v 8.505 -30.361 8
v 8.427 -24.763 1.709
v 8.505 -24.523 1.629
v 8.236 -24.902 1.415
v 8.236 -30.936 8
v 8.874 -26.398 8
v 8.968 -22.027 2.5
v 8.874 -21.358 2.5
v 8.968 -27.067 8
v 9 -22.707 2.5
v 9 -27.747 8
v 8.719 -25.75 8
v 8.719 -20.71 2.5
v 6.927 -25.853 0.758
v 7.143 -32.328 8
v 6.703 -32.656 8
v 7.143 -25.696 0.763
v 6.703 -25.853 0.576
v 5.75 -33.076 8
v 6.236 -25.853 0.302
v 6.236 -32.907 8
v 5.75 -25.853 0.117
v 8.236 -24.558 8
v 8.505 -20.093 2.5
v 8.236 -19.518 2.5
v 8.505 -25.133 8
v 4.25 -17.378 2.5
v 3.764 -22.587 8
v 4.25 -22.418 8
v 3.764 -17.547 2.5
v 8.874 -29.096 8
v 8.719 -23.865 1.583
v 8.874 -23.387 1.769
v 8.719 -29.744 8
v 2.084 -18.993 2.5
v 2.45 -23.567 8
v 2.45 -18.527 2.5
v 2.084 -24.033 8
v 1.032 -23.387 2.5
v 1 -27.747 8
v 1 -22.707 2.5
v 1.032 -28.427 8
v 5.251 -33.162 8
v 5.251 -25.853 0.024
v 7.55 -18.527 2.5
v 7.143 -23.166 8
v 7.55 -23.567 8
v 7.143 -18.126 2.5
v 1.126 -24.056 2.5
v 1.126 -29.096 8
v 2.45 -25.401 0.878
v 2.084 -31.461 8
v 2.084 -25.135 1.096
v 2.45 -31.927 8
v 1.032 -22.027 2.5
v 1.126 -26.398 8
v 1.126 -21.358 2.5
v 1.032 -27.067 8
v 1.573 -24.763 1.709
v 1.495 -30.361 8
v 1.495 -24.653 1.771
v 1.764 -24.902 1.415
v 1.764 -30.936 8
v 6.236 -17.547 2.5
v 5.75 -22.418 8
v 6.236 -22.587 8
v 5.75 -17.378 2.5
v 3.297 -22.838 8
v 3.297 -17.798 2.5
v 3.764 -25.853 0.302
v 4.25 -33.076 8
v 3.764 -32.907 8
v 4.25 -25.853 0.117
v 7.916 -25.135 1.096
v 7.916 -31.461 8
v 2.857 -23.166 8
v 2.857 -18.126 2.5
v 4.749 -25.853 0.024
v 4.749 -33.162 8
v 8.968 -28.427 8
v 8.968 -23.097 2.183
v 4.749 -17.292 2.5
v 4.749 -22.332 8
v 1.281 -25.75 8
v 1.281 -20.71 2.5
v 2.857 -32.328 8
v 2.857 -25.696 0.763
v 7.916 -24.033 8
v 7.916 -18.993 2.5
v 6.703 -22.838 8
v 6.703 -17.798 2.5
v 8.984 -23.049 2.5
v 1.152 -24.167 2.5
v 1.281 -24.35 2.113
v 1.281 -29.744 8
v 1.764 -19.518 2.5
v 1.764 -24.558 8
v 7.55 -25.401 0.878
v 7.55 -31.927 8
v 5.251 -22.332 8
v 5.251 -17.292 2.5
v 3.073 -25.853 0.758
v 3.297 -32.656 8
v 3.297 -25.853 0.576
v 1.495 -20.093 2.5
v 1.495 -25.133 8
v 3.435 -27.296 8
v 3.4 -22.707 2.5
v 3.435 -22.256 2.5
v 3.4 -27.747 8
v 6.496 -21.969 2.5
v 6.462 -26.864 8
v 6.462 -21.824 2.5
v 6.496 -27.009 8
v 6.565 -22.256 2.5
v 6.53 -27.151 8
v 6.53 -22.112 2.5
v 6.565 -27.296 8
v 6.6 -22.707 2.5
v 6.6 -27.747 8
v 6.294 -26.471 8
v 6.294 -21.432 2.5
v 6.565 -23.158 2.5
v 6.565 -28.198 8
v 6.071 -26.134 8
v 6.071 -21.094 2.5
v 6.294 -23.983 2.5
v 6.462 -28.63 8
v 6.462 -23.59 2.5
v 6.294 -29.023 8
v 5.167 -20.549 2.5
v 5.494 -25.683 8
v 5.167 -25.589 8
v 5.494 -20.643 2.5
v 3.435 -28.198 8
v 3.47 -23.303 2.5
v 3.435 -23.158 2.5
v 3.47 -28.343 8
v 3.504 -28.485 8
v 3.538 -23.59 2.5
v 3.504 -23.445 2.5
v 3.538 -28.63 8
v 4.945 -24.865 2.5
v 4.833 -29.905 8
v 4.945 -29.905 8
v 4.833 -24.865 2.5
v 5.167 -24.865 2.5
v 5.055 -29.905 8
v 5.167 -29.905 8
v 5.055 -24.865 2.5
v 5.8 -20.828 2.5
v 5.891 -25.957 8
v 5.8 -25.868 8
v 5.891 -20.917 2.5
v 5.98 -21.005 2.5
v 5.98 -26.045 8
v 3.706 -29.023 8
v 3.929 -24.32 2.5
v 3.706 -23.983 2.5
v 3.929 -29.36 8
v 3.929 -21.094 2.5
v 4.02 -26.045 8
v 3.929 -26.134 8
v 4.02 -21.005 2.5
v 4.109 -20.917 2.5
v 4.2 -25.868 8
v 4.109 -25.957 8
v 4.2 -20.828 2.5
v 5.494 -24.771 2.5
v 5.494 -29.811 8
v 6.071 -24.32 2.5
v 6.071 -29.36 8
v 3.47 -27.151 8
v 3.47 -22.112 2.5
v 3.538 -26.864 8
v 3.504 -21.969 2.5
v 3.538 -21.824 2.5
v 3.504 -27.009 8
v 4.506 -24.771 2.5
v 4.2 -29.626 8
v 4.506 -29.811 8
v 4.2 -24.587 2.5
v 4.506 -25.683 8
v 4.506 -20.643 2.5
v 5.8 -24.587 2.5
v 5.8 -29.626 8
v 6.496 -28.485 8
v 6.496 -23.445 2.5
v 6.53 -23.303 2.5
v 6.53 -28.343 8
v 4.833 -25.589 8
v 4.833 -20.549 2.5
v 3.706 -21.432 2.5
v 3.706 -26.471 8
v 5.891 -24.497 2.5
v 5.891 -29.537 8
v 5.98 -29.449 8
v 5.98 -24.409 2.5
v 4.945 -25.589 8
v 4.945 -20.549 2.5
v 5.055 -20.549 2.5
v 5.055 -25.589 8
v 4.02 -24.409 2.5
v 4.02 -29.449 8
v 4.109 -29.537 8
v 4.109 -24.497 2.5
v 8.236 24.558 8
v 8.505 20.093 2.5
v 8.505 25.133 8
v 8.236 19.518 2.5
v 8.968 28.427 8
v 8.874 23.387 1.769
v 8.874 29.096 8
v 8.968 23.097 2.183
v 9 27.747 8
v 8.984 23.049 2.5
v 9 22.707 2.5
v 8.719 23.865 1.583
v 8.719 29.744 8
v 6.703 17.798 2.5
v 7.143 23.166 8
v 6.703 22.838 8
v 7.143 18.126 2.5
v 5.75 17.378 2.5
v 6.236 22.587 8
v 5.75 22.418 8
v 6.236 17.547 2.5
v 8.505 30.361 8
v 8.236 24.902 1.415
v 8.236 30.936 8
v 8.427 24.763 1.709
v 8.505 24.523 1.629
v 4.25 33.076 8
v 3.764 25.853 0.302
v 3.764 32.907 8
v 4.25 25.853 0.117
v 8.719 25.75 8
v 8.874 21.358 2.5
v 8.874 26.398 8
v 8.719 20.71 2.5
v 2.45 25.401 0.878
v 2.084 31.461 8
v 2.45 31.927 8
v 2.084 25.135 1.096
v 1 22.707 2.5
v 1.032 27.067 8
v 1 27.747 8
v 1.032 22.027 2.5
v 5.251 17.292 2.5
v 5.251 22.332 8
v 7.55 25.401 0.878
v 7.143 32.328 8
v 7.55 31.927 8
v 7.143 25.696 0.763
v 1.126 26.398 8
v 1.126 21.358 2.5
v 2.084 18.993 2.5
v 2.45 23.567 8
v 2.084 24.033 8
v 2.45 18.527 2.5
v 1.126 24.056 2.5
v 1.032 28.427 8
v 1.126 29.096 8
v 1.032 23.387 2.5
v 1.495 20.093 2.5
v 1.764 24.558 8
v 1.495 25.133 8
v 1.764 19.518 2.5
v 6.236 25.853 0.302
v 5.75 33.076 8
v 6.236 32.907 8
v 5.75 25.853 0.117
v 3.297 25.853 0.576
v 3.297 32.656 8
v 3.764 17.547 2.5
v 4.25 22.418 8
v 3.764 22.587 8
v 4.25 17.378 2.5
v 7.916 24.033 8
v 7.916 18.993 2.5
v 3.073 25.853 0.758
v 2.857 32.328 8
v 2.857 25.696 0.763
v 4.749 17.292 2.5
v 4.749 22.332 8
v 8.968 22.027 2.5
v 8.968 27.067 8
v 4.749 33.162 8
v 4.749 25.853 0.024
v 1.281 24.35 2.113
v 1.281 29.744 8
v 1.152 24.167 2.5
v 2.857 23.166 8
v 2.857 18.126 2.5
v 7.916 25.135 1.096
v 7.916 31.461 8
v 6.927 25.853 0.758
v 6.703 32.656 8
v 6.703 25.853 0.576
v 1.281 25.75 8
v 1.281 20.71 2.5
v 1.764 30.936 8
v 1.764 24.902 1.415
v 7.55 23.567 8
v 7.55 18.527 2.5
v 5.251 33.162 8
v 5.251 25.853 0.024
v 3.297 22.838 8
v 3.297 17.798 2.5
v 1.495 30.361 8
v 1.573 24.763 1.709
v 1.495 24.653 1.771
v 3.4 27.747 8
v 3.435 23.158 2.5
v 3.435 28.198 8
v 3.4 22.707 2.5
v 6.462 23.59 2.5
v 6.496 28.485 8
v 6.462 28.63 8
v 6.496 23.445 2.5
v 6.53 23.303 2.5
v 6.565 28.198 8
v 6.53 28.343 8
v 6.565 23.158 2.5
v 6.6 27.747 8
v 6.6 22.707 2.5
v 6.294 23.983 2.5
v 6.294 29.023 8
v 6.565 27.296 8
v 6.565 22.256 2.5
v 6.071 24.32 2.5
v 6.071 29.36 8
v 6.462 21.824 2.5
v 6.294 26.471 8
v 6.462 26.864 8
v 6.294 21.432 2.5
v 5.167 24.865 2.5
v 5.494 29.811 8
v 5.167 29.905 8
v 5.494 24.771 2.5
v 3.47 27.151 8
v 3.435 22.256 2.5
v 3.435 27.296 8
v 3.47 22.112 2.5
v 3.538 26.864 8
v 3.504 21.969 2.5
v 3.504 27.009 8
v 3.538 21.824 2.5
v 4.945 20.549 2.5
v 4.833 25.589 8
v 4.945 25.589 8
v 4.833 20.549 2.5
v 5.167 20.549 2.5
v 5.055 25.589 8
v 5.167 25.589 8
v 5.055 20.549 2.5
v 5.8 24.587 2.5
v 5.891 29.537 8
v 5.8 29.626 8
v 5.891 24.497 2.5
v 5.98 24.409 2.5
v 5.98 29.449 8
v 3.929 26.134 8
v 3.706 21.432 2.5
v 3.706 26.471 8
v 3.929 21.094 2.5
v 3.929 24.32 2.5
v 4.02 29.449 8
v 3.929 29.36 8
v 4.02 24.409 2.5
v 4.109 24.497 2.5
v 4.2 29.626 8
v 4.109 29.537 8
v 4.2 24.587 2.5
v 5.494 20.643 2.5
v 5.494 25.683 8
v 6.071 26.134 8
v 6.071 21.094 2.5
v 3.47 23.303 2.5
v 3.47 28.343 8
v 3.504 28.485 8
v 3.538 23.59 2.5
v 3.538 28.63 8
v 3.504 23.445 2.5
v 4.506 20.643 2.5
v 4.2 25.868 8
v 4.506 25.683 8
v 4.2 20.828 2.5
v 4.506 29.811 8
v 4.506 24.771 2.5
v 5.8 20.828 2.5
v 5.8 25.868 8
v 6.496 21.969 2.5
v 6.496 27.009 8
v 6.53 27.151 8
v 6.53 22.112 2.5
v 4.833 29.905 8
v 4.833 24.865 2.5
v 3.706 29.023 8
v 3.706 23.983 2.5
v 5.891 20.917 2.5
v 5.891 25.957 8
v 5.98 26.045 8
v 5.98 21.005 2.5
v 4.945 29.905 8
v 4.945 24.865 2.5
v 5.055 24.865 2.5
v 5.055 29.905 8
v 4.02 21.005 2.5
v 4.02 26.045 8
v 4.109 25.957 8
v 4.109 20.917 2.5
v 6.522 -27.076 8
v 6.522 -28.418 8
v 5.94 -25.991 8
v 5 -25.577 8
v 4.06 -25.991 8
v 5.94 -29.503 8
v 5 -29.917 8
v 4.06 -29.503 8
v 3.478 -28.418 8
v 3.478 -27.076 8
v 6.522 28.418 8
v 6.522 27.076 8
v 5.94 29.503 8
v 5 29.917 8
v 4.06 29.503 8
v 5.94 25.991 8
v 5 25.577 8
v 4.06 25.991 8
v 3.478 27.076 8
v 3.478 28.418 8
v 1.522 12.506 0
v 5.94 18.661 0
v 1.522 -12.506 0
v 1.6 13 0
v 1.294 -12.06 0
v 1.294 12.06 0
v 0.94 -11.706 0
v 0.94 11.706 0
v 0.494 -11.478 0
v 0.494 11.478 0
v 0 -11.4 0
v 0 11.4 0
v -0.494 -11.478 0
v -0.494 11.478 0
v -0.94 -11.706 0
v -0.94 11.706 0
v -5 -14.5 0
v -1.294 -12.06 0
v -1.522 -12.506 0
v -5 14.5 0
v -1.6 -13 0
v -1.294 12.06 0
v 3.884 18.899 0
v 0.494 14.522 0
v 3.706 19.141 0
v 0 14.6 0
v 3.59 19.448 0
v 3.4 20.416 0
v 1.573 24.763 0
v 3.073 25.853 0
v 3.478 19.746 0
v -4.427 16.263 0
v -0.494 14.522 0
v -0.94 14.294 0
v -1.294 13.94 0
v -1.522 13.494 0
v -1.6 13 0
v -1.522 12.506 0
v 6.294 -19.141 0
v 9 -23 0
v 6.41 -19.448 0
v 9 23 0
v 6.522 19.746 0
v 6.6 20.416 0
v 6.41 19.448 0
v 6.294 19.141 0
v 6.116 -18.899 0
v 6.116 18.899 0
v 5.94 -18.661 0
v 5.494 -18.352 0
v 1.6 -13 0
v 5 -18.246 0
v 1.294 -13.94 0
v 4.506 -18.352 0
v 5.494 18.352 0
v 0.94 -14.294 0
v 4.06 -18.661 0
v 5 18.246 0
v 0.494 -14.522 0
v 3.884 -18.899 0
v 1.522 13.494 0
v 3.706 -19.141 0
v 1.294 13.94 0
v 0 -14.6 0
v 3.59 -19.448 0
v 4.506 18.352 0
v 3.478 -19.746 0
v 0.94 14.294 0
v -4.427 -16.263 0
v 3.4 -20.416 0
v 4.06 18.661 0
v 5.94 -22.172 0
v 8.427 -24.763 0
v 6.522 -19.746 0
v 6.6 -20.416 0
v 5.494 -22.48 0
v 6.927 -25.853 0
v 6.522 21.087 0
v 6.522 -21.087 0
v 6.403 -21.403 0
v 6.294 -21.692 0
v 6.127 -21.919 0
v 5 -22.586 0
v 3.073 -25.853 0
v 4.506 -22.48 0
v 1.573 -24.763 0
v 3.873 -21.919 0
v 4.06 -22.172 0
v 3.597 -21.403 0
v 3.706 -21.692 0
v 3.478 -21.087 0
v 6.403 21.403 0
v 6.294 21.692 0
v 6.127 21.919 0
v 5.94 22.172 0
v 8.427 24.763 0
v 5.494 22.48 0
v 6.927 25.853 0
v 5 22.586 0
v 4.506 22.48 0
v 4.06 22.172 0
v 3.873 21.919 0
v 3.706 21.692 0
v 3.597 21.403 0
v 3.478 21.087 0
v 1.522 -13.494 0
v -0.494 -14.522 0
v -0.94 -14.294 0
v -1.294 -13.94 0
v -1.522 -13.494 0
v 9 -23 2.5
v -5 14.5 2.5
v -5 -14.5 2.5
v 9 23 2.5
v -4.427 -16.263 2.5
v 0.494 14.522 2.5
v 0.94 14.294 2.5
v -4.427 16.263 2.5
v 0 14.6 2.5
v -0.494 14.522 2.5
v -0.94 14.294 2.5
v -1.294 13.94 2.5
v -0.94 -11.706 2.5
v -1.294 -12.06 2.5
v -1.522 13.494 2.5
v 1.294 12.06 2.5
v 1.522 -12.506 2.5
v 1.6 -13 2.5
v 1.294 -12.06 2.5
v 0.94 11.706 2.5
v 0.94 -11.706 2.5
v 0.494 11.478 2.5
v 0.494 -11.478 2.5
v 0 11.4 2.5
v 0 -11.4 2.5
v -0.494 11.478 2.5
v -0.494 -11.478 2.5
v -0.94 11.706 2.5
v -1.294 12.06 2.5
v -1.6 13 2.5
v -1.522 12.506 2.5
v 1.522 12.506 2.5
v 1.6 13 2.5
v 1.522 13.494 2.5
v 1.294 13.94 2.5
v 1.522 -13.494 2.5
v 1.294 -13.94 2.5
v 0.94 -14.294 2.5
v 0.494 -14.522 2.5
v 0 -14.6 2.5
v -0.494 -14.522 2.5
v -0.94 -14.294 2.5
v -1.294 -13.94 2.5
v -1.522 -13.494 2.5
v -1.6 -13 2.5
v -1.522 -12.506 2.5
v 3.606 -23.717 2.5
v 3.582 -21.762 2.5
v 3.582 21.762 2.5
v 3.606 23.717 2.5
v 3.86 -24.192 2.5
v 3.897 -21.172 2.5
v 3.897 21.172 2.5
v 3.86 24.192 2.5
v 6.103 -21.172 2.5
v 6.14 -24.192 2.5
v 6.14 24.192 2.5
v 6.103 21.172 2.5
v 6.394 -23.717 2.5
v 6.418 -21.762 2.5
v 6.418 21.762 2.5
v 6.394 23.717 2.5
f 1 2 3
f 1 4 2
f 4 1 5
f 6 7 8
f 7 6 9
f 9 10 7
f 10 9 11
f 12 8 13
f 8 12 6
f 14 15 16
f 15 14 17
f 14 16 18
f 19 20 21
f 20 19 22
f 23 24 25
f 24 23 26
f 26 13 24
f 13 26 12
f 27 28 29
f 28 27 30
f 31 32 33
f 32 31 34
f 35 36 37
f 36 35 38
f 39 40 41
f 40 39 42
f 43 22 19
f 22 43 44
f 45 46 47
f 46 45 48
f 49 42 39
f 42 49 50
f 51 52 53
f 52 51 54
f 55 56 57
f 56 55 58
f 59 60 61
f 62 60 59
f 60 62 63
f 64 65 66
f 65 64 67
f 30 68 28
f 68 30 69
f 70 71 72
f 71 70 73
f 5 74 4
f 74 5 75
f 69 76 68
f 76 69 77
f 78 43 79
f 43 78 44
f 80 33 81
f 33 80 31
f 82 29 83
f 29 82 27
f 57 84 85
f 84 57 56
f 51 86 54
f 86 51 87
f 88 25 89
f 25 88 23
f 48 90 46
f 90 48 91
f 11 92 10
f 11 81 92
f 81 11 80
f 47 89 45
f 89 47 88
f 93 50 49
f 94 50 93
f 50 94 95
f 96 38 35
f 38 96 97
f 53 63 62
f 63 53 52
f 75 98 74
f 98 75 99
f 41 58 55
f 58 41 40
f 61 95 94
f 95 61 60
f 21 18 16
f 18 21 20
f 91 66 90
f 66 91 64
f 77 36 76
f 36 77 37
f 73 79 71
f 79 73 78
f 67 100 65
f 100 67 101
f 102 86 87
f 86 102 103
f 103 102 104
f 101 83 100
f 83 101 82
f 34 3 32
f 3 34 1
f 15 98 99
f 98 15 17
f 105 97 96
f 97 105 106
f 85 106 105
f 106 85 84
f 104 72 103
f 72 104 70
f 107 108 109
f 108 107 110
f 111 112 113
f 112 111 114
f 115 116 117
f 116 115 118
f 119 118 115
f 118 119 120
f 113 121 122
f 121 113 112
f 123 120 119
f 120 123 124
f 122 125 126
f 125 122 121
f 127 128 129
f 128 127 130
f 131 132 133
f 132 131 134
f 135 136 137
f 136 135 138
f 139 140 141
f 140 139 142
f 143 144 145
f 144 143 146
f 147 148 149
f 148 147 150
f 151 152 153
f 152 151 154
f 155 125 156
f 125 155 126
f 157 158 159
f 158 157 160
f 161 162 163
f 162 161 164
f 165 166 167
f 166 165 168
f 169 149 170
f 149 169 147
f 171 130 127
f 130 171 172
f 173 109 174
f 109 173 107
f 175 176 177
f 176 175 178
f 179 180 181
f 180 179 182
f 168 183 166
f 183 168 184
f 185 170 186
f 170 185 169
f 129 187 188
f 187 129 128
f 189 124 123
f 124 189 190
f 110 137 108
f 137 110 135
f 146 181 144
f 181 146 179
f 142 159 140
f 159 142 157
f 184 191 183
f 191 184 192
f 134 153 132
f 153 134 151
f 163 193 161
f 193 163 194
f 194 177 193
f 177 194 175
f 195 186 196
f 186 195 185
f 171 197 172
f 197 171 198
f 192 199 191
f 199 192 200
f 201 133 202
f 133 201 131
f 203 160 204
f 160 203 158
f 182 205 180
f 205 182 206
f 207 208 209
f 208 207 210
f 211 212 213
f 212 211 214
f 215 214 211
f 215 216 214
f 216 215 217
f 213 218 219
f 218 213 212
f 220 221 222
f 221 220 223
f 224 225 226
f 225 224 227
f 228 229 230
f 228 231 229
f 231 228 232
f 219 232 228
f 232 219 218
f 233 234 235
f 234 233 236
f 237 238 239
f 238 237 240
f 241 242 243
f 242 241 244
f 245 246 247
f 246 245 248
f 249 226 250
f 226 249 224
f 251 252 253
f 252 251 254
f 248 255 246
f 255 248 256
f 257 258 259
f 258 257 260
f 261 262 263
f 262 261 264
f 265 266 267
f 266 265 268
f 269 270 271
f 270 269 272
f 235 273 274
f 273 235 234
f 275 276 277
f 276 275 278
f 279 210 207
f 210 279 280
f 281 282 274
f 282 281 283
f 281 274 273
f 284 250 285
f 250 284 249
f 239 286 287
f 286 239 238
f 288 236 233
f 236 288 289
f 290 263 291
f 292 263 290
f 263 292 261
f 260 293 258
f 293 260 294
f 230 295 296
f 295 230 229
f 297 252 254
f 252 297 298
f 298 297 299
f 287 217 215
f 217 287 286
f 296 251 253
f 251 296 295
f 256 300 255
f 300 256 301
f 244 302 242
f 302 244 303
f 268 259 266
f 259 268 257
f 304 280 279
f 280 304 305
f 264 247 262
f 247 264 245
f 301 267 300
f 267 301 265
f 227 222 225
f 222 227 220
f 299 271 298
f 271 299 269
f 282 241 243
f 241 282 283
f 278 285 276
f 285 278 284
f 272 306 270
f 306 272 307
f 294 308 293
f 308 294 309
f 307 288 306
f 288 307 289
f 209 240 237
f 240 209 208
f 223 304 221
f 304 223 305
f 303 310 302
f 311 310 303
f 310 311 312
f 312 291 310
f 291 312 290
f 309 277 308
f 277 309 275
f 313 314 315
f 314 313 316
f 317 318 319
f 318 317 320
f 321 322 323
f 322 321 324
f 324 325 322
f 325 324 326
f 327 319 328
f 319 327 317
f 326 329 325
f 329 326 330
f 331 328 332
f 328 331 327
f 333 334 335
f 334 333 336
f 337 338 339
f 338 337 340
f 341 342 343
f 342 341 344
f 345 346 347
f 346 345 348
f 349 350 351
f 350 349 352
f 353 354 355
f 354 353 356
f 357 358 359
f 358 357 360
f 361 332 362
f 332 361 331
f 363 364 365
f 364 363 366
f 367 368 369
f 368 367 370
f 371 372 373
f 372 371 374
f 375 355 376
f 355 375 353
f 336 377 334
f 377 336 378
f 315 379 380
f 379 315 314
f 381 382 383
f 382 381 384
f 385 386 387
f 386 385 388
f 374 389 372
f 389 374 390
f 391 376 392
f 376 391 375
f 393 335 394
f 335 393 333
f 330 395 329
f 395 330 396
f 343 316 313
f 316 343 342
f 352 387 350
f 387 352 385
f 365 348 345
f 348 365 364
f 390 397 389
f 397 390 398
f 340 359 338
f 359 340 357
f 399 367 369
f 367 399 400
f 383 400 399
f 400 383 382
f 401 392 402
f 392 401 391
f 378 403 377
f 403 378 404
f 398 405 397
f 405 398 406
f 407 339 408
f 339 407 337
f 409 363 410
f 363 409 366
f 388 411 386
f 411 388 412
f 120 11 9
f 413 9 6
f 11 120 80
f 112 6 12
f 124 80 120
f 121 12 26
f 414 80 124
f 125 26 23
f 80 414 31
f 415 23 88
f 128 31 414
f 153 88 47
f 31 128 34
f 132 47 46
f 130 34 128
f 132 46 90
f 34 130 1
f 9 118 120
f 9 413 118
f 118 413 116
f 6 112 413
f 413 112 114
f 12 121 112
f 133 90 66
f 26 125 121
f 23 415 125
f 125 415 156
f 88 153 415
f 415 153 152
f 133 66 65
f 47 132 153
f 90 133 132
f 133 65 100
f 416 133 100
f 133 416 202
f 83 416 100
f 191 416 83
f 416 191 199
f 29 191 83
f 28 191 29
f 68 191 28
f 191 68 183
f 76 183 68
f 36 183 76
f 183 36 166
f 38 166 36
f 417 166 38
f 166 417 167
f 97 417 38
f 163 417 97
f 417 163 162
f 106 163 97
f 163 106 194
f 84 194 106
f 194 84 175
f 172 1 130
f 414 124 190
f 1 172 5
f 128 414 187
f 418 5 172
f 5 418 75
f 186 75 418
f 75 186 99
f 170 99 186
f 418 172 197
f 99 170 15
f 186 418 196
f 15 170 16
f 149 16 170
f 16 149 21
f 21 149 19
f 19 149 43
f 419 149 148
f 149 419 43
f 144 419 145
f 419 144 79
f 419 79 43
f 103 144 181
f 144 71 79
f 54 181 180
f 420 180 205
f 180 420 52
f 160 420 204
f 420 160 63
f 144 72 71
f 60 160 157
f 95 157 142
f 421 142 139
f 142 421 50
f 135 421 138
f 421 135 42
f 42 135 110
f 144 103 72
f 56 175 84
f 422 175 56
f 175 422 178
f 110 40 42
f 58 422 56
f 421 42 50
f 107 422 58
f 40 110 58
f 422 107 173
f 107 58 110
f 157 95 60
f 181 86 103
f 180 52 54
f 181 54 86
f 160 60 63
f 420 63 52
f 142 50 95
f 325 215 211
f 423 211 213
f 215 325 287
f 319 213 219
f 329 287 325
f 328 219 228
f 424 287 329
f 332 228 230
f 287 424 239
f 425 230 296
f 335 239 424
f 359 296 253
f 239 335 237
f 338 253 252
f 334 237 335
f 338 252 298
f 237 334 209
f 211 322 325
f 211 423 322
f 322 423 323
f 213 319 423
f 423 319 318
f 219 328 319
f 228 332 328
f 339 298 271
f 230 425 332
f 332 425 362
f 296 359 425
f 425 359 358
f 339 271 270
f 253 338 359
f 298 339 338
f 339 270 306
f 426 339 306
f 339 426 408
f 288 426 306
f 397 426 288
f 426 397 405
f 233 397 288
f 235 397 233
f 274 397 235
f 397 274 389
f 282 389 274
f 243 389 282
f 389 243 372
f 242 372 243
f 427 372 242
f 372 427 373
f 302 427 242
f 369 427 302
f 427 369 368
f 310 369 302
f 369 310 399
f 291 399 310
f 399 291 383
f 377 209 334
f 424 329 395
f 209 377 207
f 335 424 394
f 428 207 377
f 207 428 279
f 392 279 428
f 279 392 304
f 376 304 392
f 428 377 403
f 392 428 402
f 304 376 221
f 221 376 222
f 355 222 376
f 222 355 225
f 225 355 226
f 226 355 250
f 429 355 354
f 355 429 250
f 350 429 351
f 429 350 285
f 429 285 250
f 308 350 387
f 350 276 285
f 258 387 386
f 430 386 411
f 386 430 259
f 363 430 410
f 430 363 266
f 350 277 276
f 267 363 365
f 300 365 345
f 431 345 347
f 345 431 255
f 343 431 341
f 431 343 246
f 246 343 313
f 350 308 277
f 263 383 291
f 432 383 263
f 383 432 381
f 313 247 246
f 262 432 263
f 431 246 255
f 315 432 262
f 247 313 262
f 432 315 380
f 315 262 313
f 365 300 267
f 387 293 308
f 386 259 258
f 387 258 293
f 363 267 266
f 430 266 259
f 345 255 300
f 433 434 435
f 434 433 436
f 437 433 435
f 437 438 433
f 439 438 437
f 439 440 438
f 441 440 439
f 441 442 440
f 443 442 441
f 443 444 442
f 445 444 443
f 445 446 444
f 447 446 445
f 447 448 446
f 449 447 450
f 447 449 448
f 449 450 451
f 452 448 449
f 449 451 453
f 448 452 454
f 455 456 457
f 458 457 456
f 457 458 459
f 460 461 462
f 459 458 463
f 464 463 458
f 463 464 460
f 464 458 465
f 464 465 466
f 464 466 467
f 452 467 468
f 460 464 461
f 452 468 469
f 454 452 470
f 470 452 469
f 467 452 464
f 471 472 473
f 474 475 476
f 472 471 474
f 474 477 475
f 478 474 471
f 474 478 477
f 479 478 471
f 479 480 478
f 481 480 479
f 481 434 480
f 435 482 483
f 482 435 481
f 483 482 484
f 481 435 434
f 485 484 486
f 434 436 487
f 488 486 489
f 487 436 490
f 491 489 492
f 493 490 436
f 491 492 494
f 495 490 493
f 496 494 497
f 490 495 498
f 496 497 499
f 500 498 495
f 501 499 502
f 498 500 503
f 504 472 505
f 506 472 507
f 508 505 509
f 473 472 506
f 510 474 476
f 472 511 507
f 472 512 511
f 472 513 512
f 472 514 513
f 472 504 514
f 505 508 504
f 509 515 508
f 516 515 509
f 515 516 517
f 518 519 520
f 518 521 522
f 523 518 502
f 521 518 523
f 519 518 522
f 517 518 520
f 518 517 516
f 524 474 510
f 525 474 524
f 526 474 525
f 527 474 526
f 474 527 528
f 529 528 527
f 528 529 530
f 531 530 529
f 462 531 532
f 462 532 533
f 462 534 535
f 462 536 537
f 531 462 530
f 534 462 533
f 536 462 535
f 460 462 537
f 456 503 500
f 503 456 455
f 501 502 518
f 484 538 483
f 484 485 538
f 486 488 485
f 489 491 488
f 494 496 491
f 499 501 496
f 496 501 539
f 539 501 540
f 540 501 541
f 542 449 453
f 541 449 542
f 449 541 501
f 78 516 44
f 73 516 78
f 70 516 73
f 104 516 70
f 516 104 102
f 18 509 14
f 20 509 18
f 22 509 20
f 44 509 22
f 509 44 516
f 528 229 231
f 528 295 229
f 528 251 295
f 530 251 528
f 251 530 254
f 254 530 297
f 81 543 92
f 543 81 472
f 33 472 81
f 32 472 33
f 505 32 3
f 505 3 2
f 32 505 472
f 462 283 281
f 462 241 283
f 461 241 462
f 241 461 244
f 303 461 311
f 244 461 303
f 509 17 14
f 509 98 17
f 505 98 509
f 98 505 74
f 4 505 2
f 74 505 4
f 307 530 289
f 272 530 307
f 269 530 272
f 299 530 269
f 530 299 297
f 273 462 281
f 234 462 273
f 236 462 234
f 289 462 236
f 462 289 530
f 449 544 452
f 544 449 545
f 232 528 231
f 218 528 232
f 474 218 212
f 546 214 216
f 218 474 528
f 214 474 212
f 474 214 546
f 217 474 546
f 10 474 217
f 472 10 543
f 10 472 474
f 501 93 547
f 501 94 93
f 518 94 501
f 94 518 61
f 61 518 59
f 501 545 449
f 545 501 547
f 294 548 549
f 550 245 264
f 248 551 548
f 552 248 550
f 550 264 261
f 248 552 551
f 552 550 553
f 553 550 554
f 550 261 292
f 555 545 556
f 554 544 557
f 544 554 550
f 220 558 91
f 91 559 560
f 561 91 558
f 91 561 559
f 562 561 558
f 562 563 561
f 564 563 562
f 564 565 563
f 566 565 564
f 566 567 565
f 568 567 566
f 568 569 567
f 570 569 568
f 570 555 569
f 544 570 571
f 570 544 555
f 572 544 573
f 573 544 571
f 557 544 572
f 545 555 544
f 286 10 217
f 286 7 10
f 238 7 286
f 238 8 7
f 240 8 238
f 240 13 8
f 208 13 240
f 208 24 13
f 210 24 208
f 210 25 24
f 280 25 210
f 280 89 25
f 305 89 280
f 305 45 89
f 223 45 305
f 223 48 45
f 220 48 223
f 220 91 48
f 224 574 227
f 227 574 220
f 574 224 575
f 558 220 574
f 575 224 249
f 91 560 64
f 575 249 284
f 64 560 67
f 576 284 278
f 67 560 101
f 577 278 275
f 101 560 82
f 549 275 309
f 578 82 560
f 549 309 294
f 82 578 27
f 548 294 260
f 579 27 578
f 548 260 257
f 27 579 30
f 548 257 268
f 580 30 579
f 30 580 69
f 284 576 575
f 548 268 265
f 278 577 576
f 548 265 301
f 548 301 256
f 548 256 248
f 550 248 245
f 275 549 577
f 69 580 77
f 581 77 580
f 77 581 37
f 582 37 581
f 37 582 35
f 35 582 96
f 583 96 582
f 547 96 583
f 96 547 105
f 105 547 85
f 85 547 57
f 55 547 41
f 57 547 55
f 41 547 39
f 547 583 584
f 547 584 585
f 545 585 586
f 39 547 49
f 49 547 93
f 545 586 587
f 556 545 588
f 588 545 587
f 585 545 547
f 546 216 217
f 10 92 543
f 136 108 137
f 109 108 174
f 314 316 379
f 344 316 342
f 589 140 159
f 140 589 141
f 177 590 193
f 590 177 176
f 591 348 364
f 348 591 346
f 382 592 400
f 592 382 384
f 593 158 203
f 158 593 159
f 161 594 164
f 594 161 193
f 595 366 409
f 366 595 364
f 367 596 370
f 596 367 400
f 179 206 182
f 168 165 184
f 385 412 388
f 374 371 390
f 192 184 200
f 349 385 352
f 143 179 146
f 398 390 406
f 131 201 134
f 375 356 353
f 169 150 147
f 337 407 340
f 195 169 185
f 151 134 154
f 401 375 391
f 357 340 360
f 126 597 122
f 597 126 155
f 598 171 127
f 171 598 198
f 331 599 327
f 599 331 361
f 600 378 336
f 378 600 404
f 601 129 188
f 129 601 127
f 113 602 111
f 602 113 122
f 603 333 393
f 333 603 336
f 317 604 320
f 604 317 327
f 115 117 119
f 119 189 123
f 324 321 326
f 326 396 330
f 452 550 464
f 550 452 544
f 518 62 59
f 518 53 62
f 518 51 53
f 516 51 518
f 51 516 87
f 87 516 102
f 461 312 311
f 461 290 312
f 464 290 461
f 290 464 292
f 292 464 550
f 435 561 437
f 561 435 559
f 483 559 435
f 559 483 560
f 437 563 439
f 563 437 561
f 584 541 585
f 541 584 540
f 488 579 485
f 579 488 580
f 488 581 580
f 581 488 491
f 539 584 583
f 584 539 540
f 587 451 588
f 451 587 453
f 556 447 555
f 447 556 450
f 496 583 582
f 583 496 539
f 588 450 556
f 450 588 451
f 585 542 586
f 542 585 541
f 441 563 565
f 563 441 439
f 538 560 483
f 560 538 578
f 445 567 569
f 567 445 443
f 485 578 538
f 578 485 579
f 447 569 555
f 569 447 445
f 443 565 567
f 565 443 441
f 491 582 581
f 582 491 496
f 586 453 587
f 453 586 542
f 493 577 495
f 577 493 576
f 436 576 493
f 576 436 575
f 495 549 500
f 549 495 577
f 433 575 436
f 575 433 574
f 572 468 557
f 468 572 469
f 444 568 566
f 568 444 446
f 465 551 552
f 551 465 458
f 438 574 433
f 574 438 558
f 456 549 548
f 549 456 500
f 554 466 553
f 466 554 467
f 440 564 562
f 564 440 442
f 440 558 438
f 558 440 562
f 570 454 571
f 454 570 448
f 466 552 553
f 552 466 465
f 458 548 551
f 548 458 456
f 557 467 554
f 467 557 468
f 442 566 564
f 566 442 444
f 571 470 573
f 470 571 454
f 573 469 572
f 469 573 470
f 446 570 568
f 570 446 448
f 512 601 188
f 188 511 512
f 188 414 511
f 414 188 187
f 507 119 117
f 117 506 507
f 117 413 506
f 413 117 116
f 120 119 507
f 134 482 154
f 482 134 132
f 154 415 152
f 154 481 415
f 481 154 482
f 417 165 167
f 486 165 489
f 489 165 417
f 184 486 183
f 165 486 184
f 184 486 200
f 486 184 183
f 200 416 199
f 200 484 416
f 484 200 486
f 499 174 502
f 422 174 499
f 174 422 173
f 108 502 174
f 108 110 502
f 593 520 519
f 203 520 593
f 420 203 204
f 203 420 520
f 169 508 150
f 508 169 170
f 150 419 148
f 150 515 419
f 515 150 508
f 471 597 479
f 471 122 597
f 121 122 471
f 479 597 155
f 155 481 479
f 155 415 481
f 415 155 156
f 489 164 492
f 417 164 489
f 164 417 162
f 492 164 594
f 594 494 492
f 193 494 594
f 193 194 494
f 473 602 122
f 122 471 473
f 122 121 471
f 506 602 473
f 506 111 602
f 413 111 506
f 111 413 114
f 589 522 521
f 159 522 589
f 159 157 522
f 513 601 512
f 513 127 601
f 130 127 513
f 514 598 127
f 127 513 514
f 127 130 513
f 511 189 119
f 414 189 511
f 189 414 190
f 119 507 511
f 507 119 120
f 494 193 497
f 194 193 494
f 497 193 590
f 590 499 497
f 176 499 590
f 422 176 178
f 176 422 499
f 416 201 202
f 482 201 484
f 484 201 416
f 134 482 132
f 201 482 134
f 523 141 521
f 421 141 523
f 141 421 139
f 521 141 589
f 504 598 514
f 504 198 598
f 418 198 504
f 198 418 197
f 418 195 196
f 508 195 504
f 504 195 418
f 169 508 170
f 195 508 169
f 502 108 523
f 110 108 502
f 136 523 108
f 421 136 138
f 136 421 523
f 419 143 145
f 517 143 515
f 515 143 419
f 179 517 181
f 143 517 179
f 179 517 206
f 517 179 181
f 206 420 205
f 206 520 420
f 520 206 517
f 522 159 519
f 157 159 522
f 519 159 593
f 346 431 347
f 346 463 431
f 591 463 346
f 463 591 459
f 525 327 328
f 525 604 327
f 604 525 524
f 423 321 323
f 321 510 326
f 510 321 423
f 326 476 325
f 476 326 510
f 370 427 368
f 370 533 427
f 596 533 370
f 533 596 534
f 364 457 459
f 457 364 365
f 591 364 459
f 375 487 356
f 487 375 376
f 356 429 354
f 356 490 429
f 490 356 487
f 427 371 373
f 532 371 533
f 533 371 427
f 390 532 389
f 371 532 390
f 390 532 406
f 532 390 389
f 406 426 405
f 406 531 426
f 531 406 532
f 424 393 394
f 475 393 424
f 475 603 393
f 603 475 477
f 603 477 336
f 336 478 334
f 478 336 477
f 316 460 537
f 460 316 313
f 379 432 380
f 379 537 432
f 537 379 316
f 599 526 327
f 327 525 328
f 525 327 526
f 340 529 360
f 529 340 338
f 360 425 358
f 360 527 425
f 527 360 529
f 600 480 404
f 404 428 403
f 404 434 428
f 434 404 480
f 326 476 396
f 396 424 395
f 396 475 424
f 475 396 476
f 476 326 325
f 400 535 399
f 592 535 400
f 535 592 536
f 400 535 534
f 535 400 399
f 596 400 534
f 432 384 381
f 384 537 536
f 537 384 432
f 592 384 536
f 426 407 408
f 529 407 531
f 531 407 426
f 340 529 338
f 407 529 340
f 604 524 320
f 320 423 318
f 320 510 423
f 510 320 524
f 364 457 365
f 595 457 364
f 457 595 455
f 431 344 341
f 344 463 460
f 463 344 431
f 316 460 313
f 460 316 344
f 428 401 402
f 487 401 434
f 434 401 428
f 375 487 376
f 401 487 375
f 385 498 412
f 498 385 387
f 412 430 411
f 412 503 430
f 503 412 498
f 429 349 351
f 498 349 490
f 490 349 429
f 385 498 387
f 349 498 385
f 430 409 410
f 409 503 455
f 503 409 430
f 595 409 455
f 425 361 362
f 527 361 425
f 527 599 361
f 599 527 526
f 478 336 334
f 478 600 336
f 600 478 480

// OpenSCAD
// file: dronePlates.scad
/**
 * dronePlates.scad
 * Plate library
 *
 * GNU GPL V3
 * @author: Victor Potenciano
 */

m3Rad = 3.4/2;
cornerR = 4;

/**
 *
 */
module helperDisk(diameter) {
	cylinder(r = diameter/2, h = 0.6, $fn=20);
}

/**
 *
 */
module roundedRect(size, radius) {
	x = size[0];
	y = size[1];
	z = size[2];

	linear_extrude(height=z)
	hull() {
	// place 4 circles in the corners, with the given radius
	translate([(-x/2)+(radius/2), (-y/2)+(radius/2), 0]){ circle(r=radius); }
	translate([(x/2)-(radius/2), (-y/2)+(radius/2), 0]){ circle(r=radius); }
	translate([(-x/2)+(radius/2), (y/2)-(radius/2), 0]){ circle(r=radius); }
	translate([(x/2)-(radius/2), (y/2)-(radius/2), 0]){ circle(r=radius); }
	}
}

/**
 * rounded rectangle triangle with corner at origin
 */
module roundedTriangle(size, radius) {
	x = size[0];
	y = size[1];
	z = size[2];

	linear_extrude(height=z)
	hull() {
	translate([radius, radius, 0]){ circle(r=radius); }
	translate([x-radius, radius, 0]){ circle(r=radius); }
	translate([radius, y-radius, 0]){ circle(r=radius); }
	}
}

/**
 *
 */
module roundRectPlate(w, l, plateThick=3) {
	difference(){
		roundedRect([l+m3Rad*1.75,w+m3Rad*1.75,plateThick], cornerR);
		translate([l/2, w/2, -0.5]) { cylinder(h = plateThick+1, r = m3Rad, $fn=30); }
		translate([-l/2, w/2, -0.5]) { cylinder(h = plateThick+1, r = m3Rad, $fn=30); }
		translate([l/2, -w/2, -0.5]) { cylinder(h = plateThick+1, r = m3Rad, $fn=30); }
		translate([-l/2, -w/2, -0.5]) { cylinder(h = plateThick+1, r = m3Rad, $fn=30); }
	}
}

/**
 *
 */
module crossSquarePlate(l, thick=3) {
	inDist = cornerR*2+4;
	trianL = sqrt((l*l)/2)-inDist;
	centerR = 4;

	difference(){
		roundRectPlate(l, l, thick);
		translate([0, centerR, -0.5]) { 
			rotate([0,0,45]){ roundedTriangle([trianL,trianL,thick+1], cornerR-2); }
		}
		translate([0, -centerR, -0.5]) { 
			rotate([0,0,225]){ roundedTriangle([trianL,trianL,thick+1], cornerR-2); }
		}
		translate([-centerR, 0, -0.5]) { 
			rotate([0,0,135]){ roundedTriangle([trianL,trianL,thick+1], cornerR-2); }
		}
		translate([centerR, 0, -0.5]) { 
			rotate([0,0,-45]){ roundedTriangle([trianL,trianL,thick+1], cornerR-2); }
		}
	}
}

/**
 *
 */
module hShapePlate(w, l, thick=4) {
	inDist = cornerR*2+1;

	difference(){
		roundRectPlate(w, l, thick);
		translate([0, w/4, -0.5]) { roundedRect([l-inDist,w/2-inDist,thick+1], cornerR-2); }
		translate([0, -w/4, -0.5]) { roundedRect([l-inDist,w/2-inDist,thick+1], cornerR-2); }
	}
}

/**
 *
 */
module motorCircleMount(inDia, outDia, thick=3, extraH=false, d1=19, d2=16, holeR=m3Rad ) {
	difference(){
		cylinder(h = thick, r = outDia/2, $fn=30);
		motorCircleMountHoles(inDia, outDia, thick, extraH, d1=d1, d2=d2, holeR=holeR);
	}
}

/**
 *
 */
module motorCircleMountHoles(inDia, outDia, thick=3, extraH=false, d1=19, d2=16, d3=25, holeR=m3Rad) {
	translate([0, 0, -0.5]) { cylinder(h = thick+1, r = inDia/2, $fn=30); }

	for(i=[0:3]) {
		rotate([0,0,90*i]){
		translate([d1/2, 0, -0.5]) cylinder(h = thick+1, r = holeR, $fn=20);
		translate([d2/2, 0, -0.5]) cylinder(h = thick+1, r = holeR, $fn=20);
		translate([d2/2, -holeR, -0.5]) cube(size = [(d1-d2)/2,holeR*2,thick+1]);
		}
	}
	
	if(extraH==true){	
		for(i=[-1,1]) translate([i*d3/2, 0, -0.5]) { cylinder(h = thick+1, r = holeR, $fn=30); }
	}
}

/**
 *
 */
module motorRectMount(w, l, inDia, thick=3) {
	d1=19;
	d2=16;

	difference(){
		roundRectPlate(w, l, thick);
		translate([0, 0, -0.5]) { cylinder(h = thick+1, r = inDia/2, $fn=30); }
		translate([0, d1/2, -0.5]) { cylinder(h = thick+1, r = m3Rad, $fn=30); }
		translate([0, -d1/2, -0.5]) { cylinder(h = thick+1, r = m3Rad, $fn=30); }
		translate([d2/2, 0, -0.5]) { cylinder(h = thick+1, r = m3Rad, $fn=30); }
		translate([-d2/2, 0, -0.5]) { cylinder(h = thick+1, r = m3Rad, $fn=30); }
	}
}

/**
 *
 */
module tube(inDia, outDia, height) {
	difference(){
		cylinder(h = height, r = outDia/2, $fn=50);
		translate([0, 0, -0.5]) { cylinder(h = height+1, r = inDia/2, $fn=30); }
	}
}

/**
 *
 */
module squareTube(inDia, outDia, height) {
	translate([0,0,height/2]){
	difference(){
		cube(size = [outDia,outDia,height], center = true);
		cube(size = [inDia,inDia,height+1], center = true);
	}
	}
}

/**
 *
 */
module djiFlamewheelHoles(height) {
	a = 23;
	b = 16;
	c = 19.5;
	
	translate([a/2, c/2, 0]) { cylinder(h = height, r = m3Rad, $fn=30); }
	translate([-a/2, c/2, 0]) { cylinder(h = height, r = m3Rad, $fn=30); }
	translate([b/2, -c/2, 0]) { cylinder(h = height, r = m3Rad, $fn=30); }
	translate([-b/2, -c/2, 0]) { cylinder(h = height, r = m3Rad, $fn=30); }
}

/**
 *
 */
module djiFlamewheelHolesBotton(height) {
	a1 = 21;
	c = 19.5;
	
	translate([a1/2, c/2, 0]) { cylinder(h = height, r = m3Rad, $fn=30); }
	translate([-a1/2, c/2, 0]) { cylinder(h = height, r = m3Rad, $fn=30); }
}

/**
 *
 */
module propeller(size){
union(){
difference(){
	cylinder(h = 3, r = size/2, center=true, $fn=30);
	cylinder(h = 3.1, r = size/2-2, center=true, $fn=30); 
}
for( i = [-1,1] ){
rotate([0,0,45*i]){ cube(size = [size,4,1], center = true); }
}
}
}

/**
 *
 */
module slot(length, height, rad){
for(i=[-1,1]) translate([i*length/2,0,0]) cylinder(h = height, r = rad, $fn=30);
translate([0,0,height/2]) cube(size = [length,rad*2,height], center = true);
}

 

////////////////////////
// Examples:
////////////////////////

motorCircleMount(8, 25, 3.5);

//roundedRect([50,50,3], 4);

//hShapePlate(79, 25);

//rotate([0,0,45]){roundedTriangle([40,40,3], 4);}

//crossSquarePlate(45, 4);

/*
union(){
motorRectMount(21, 18, 8, 4);
translate([9, 10.5, 0]) {tube(m3Rad*2, 6.5, 6);}
}
*/

/*
difference(){
union(){
hShapePlate(50, 30, 3.5);
translate([-4,-25,0]){cube(size = [8,50,3.5]);}
rotate([0, 0, 45]) {motorCircleMount(8, 35, 3.5);}
}
cylinder(h = 10, r = 4, $fn=100, center=true);
}
*/

//rotate([90,0,0]){ tube(5,10,20); }
//translate([20,0,0]){ squareTube(5, 10, 20); }
// main file
/**
 * mini H parametrized antenna mount
 */
 
use <dronePlates.scad>;

holeDist = 26;
m3Rad = 3.2/2;
thick = 2.5;
angle2 = 85;
antDist = 39;
holeAntShift = 5;

difference(){
    union(){
        hull(){
            for(i=[-1,1]) translate([0,i*holeDist/2,0]) roundedRect([7,6,thick],3);
            translate([holeAntShift,0,0]) roundedRect([5,antDist+10,thick],3);
        }
        
        //translate([-8/2+holeAntShift,-(antDist+7)/2,0]) cube(size=[8,antDist+7,thick+2.5]);
        
        //antenna holder
        difference(){

        for(i=[-1,1]){
        translate([holeAntShift,i*antDist/2,-1]) rotate([-i*angle2/2,0,0]) tube(m3Rad*2, 8, 19);
        }

        translate([holeAntShift,0,-10/2]) cube(size=[100,100,10], center=true);
        for(i=[-1,1]){
        translate([holeAntShift,i*antDist/2,10/2+8]) cube(size=[20,40,10], center=true);
        }

        }//diff
    }
    
    for(i=[-1,1]){
        translate([0,i*holeDist/2,-0.5]) cylinder(r=m3Rad, h=thick+1, $fn=20);
    }
    
    for(i=[-1,1]){
    translate([holeAntShift,i*antDist/2,-1]) rotate([-i*angle2/2,0,0]) cylinder(r=m3Rad, h=90, $fn=20,center=true);
    }
}
